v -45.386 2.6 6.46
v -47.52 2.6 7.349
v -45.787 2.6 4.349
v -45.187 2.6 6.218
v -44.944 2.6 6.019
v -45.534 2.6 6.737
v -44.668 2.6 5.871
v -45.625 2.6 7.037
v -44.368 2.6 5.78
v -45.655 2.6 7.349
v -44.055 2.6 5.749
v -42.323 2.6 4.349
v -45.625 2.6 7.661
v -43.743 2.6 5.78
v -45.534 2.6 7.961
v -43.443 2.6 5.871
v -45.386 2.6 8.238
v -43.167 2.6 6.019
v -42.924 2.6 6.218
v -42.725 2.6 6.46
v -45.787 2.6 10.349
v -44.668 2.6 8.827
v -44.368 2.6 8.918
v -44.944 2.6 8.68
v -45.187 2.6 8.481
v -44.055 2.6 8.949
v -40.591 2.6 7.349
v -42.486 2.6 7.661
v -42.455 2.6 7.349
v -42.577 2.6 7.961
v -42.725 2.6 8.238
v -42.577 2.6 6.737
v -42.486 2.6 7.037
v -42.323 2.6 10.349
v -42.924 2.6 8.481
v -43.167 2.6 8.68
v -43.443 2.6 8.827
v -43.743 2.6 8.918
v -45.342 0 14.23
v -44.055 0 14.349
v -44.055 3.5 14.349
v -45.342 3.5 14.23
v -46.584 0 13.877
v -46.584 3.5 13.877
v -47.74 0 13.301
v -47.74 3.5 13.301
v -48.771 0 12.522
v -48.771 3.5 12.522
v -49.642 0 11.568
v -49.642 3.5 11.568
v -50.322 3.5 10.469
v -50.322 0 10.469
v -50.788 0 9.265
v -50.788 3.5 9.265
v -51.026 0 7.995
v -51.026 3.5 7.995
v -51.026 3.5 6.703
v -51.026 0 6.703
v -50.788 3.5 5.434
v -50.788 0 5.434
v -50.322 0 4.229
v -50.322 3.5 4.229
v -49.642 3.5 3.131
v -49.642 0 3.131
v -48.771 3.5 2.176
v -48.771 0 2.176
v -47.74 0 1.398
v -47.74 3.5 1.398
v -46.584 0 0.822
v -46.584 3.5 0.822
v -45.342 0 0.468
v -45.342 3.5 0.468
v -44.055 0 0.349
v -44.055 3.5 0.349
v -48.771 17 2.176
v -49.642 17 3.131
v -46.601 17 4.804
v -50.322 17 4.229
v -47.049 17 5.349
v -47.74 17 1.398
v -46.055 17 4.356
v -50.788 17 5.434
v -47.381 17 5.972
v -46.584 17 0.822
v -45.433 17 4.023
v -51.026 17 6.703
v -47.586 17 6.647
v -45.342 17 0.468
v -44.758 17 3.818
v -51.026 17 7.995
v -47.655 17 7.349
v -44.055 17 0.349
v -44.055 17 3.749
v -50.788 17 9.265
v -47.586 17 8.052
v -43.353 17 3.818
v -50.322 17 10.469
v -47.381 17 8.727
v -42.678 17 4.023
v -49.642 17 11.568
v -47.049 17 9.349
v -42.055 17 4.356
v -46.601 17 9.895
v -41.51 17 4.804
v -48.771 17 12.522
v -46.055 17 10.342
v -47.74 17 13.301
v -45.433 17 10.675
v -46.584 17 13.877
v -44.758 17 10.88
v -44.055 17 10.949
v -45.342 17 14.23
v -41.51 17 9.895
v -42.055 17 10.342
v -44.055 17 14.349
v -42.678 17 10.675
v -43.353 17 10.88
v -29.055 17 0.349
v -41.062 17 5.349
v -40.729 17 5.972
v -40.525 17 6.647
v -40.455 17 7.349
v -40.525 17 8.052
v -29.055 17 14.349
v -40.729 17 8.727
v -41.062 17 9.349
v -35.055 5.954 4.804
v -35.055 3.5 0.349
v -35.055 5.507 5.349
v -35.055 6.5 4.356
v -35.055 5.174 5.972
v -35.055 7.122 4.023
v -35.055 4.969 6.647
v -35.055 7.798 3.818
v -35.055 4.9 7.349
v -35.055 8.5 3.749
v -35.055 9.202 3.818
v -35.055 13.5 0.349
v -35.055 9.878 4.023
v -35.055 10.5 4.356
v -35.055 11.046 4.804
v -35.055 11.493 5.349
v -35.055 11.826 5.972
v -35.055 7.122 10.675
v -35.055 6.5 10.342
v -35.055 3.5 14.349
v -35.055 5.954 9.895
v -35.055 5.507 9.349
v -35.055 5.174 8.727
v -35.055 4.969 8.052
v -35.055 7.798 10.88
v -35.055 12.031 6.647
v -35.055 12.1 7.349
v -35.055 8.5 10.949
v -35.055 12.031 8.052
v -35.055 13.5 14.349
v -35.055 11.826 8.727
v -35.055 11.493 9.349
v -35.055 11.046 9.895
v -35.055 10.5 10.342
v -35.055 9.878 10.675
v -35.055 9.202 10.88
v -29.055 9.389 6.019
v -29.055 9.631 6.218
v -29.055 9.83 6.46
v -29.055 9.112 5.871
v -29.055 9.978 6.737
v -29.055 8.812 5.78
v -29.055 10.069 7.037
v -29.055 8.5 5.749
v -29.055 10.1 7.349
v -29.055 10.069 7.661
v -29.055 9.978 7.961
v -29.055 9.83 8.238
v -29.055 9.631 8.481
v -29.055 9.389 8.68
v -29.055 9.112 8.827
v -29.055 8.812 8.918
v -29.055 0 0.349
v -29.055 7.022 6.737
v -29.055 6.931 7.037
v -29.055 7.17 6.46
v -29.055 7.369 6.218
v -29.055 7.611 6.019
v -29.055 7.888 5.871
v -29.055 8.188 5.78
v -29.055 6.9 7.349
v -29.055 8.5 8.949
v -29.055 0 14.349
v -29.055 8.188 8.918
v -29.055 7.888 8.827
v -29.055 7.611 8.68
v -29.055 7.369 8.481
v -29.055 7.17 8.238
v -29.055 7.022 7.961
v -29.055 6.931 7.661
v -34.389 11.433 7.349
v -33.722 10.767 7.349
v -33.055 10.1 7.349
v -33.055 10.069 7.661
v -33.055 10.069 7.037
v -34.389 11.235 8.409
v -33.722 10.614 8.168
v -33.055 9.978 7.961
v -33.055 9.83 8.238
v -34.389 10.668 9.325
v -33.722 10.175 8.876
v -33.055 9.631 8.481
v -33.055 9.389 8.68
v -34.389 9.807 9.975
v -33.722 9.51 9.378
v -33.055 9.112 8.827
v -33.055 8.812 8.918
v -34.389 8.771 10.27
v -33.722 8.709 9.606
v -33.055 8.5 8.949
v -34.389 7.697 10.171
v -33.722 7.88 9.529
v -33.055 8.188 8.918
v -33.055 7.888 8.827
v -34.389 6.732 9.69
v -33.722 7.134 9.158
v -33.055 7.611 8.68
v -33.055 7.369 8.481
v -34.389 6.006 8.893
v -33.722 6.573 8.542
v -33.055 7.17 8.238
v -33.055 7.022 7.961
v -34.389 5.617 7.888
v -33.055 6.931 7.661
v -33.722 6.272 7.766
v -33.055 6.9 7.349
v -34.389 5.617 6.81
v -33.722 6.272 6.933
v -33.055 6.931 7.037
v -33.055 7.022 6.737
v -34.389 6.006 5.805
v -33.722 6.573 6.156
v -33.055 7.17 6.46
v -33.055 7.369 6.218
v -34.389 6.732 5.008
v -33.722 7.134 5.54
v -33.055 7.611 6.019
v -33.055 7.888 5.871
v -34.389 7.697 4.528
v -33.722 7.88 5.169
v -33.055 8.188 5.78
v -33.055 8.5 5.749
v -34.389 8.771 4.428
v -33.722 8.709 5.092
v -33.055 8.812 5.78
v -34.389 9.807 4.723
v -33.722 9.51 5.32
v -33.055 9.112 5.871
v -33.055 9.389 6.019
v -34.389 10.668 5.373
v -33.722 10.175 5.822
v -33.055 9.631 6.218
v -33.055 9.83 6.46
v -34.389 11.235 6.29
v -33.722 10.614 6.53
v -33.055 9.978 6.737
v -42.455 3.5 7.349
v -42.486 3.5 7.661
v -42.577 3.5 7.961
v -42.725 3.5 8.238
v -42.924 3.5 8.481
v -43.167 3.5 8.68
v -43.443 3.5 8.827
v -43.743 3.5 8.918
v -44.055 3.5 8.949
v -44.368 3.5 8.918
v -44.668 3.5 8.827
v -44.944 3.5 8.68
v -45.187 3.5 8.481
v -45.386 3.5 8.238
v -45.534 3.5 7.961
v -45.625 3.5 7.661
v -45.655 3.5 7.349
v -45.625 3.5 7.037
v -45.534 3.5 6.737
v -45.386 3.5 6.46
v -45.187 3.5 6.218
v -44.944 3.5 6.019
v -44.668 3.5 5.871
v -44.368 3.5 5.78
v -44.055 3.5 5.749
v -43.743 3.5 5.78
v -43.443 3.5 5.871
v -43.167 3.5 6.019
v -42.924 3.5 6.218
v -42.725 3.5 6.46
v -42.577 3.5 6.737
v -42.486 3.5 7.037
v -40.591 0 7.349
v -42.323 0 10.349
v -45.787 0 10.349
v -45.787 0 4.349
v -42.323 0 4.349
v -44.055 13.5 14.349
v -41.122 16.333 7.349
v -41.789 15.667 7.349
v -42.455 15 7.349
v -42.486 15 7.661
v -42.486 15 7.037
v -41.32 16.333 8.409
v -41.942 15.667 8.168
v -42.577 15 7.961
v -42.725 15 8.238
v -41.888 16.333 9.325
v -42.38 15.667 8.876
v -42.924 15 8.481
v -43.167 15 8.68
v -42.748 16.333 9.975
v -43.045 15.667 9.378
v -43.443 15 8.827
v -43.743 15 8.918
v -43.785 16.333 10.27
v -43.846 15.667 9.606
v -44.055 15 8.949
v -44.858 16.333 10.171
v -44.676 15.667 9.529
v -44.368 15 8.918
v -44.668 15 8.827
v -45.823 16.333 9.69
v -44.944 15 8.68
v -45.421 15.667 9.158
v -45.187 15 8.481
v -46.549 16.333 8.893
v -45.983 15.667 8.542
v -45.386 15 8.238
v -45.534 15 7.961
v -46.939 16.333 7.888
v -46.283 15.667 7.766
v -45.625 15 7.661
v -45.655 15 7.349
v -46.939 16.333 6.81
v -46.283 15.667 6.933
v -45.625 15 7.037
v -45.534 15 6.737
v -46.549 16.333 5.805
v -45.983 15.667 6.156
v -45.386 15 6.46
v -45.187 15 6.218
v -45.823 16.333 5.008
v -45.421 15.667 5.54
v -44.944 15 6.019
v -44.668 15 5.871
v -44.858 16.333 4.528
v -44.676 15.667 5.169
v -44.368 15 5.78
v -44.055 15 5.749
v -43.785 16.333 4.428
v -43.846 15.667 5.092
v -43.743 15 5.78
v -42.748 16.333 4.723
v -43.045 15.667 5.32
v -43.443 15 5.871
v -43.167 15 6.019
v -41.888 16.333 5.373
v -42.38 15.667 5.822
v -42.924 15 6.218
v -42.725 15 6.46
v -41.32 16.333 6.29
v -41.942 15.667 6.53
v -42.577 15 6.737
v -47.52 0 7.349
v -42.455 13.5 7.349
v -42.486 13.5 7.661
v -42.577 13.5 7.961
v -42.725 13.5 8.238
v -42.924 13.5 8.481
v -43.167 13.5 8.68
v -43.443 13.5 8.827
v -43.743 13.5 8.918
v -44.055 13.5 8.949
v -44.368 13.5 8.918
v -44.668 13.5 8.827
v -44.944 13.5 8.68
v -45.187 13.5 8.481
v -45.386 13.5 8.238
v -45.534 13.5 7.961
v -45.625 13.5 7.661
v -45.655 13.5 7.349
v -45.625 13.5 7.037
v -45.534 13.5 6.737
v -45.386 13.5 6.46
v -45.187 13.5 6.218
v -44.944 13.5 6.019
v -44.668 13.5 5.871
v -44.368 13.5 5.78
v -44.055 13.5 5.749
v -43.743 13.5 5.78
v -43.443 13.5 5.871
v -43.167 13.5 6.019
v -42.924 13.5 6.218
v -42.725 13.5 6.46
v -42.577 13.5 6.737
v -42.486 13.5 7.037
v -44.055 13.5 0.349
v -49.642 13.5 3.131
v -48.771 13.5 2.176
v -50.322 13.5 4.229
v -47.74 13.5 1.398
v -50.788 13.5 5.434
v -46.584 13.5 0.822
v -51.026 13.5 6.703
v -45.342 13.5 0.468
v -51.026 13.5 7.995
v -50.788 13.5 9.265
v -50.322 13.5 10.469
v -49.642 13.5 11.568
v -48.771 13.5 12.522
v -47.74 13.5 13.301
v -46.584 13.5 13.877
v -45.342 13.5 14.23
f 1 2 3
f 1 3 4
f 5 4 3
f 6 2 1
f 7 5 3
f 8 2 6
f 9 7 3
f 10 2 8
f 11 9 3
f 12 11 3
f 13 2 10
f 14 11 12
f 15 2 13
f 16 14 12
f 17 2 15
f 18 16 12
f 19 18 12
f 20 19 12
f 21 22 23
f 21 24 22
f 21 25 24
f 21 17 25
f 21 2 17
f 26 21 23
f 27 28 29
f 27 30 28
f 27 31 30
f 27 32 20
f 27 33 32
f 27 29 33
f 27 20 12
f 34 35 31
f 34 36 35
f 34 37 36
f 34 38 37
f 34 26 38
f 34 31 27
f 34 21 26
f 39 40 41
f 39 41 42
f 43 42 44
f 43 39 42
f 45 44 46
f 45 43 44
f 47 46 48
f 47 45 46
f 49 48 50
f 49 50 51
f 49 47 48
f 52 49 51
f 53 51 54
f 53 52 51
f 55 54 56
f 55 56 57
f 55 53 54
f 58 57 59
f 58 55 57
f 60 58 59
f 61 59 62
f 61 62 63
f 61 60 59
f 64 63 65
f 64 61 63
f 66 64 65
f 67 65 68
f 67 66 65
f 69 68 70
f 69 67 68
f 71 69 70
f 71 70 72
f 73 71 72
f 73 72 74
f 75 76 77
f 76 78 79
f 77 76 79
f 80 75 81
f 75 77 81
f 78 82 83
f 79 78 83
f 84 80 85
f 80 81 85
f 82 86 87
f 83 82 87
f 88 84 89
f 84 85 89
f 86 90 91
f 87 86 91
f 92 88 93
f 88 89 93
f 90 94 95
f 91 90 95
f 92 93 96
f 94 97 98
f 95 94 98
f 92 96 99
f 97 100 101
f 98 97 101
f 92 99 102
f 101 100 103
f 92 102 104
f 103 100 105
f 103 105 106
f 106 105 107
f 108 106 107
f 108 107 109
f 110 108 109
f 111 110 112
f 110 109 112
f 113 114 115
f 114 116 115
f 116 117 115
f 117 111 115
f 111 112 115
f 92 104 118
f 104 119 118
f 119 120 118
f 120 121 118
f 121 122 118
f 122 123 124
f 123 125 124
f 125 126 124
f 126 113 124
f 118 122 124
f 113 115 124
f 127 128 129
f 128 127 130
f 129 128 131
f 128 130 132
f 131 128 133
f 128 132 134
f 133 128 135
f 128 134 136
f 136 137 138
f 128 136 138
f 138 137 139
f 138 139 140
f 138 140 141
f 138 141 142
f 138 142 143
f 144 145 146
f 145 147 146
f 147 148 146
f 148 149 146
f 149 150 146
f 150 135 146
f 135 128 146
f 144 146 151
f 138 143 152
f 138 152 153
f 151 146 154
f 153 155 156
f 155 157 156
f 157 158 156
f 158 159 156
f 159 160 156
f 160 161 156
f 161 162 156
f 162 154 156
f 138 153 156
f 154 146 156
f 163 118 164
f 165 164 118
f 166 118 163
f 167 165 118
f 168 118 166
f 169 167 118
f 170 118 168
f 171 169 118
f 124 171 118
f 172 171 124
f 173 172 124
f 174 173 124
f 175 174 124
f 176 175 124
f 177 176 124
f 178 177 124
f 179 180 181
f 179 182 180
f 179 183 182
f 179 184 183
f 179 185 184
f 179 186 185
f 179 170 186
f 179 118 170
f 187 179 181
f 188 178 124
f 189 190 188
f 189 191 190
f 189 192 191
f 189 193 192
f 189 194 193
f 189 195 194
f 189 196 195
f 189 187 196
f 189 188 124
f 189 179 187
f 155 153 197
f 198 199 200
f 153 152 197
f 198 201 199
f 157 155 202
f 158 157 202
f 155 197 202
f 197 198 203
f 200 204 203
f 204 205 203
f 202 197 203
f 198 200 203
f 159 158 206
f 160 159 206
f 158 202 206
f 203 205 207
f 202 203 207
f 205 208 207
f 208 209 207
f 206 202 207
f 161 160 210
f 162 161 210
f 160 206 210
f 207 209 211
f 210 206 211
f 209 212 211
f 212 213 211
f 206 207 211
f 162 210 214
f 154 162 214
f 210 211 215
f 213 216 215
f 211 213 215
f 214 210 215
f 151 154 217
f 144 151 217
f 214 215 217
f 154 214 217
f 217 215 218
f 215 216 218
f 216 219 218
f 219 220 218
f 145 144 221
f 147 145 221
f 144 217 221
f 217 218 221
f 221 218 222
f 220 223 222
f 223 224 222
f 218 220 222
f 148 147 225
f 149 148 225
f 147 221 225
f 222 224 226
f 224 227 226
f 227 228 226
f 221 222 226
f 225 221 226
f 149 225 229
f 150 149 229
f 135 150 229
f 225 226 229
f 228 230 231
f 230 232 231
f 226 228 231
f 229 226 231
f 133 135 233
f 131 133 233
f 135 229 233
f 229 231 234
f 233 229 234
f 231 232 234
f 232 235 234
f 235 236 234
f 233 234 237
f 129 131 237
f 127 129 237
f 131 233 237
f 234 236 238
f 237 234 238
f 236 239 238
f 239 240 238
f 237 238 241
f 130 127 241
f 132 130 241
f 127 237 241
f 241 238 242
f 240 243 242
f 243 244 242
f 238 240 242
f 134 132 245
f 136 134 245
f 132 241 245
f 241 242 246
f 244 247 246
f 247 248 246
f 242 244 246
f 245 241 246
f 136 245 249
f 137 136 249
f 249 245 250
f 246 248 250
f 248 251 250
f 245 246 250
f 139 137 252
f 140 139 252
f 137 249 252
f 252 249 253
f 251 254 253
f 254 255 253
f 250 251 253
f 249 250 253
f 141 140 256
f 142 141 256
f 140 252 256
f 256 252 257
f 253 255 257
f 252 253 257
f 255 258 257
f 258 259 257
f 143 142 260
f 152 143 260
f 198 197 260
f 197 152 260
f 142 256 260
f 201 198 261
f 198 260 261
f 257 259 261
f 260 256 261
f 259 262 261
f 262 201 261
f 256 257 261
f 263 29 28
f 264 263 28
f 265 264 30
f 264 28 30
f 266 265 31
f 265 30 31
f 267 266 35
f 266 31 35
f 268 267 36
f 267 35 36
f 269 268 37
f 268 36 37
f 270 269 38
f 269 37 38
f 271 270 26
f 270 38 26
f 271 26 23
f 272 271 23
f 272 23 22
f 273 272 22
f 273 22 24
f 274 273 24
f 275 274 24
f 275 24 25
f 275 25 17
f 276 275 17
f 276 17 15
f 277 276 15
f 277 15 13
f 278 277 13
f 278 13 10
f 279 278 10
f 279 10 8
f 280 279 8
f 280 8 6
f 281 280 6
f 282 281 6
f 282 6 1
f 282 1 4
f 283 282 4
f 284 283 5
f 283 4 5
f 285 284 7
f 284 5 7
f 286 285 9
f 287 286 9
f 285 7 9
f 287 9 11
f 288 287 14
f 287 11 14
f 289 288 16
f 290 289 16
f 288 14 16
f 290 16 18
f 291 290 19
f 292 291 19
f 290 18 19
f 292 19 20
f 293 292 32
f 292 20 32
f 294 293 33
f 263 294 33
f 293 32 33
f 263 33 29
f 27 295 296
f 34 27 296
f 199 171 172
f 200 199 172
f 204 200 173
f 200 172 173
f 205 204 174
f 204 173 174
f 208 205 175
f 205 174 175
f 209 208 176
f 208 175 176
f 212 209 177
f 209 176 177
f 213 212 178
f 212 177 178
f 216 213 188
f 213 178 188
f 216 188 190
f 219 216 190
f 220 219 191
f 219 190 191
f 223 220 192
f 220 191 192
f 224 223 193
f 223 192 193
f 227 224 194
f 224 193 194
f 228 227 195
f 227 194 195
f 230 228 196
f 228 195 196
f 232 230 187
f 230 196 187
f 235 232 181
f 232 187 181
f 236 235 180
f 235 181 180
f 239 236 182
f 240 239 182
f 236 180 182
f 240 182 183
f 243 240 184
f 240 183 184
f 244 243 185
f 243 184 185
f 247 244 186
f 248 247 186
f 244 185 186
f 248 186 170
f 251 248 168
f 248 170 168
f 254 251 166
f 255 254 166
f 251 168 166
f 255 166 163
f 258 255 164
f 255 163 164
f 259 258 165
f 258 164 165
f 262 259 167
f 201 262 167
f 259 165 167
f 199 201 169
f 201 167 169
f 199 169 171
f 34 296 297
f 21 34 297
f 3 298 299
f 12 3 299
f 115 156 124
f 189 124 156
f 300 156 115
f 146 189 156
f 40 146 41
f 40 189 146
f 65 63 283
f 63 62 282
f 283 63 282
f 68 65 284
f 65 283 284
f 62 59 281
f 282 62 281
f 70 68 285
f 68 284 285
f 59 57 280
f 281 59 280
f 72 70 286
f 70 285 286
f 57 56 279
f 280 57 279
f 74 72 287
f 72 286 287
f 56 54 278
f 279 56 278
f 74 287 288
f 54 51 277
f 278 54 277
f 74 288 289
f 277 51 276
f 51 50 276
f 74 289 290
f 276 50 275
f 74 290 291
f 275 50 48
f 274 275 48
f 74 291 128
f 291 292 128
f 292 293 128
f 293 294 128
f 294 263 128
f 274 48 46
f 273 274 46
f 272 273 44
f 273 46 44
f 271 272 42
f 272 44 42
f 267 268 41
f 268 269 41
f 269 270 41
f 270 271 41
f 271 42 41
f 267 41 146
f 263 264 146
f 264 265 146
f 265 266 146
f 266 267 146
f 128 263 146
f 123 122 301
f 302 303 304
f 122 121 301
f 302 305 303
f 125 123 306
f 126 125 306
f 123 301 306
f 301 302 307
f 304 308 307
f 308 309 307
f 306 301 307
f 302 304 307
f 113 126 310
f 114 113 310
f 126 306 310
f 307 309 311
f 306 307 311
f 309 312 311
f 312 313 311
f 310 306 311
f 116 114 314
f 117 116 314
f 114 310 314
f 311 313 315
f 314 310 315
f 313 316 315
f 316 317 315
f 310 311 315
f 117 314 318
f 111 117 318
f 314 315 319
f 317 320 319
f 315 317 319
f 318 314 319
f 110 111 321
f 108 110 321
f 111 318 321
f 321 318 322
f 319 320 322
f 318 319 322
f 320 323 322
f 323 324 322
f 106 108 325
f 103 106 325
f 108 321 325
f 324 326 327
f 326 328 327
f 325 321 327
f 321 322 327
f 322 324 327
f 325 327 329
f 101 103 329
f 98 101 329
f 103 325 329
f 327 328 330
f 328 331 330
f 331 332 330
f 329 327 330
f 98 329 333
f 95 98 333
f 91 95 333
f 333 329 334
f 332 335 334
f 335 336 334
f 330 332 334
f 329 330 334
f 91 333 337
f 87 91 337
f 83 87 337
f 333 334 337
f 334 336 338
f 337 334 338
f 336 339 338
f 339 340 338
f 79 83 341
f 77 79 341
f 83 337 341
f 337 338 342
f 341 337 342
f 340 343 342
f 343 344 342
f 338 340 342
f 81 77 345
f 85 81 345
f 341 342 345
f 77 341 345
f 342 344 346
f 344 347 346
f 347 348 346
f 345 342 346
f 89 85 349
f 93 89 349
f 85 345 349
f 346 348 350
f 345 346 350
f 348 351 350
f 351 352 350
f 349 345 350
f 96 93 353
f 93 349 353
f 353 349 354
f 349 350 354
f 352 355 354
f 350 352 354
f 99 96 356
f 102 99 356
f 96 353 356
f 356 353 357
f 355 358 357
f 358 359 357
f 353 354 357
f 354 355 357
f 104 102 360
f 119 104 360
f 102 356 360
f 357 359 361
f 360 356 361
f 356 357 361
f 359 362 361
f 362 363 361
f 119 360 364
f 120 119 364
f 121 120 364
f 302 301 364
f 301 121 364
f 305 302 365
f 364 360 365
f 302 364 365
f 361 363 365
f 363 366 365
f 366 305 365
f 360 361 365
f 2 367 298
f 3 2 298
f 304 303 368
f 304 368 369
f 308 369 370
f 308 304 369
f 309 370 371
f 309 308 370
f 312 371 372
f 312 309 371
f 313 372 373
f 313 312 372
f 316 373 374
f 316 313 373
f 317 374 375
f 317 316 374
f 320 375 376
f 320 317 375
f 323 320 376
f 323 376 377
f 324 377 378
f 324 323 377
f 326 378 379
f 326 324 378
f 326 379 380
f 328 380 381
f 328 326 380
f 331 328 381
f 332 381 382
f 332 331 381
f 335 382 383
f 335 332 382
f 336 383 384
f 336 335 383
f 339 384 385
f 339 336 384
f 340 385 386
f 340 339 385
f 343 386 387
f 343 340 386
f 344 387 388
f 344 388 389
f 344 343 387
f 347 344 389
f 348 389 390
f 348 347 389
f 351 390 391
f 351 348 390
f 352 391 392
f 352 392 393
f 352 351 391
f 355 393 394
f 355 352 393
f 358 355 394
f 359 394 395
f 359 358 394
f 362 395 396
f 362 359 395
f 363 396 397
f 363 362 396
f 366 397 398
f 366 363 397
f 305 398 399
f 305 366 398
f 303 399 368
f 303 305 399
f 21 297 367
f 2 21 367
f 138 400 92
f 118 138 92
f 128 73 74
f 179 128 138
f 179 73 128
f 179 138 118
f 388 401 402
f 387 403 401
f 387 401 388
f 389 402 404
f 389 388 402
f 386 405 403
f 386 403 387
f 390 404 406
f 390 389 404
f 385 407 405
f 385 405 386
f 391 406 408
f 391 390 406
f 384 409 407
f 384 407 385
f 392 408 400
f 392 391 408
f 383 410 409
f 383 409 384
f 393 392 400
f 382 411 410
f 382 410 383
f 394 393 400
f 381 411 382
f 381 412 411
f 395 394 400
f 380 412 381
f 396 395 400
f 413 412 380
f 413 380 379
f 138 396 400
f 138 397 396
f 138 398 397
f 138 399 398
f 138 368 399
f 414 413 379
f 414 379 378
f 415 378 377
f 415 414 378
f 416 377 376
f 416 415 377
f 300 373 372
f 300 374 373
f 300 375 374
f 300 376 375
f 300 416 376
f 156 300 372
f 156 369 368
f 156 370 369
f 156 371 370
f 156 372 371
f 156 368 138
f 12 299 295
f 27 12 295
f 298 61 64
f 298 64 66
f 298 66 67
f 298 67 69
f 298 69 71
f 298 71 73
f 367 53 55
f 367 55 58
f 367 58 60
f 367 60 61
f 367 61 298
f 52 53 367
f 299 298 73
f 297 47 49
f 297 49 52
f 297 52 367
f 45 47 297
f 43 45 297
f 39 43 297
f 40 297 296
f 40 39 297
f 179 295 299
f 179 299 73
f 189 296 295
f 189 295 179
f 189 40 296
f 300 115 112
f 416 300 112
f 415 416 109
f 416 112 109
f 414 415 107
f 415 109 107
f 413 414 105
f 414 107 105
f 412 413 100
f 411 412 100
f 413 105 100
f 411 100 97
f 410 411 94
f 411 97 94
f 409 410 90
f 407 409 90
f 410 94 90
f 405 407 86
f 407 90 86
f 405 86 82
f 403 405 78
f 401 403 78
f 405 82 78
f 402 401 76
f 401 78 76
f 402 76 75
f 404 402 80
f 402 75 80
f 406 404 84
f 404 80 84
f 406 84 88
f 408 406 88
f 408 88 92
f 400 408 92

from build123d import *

# Parameters (mm, degrees)
F0_R     = 1.6
F4_DEPTH = 3.5
F3_W     = 17
F3_H     = 14
F3_R     = 1.6
F7_DEPTH = 6
F8_R     = 1.6
F9_DEPTH = 2.6
F10_SIZE = 2


with BuildPart() as f4:
    # F0 (on Front) → F4 (new body, through all)
    with BuildSketch(Plane.XZ):
        with BuildLine():
            Line((-29.0554127395, 14.3491971341), (-44.0554127395, 14.3491971341))
            ThreePointArc((-44.0554127395, 14.3491971341), (-51.0554127395, 7.3491971341), (-44.0554127395, 0.3491971341))
            Line((-44.0554127395, 0.3491971341), (-29.0554127395, 0.3491971341))
            Line((-29.0554127395, 0.3491971341), (-29.0554127395, 14.3491971341))
        make_face()
        with Locations((-44.0554127395, 7.3491971341)):
            Circle(F0_R, mode=Mode.SUBTRACT)
    extrude(amount=-F4_DEPTH)


with BuildPart() as f6_1:
    # F6: instance of F4
    add(f4.part.mirror(Plane(origin=(0, 8.5, 0), x_dir=(-1, 0, 0), z_dir=(0, 1, 0))))


with BuildPart() as f4_1:
    add(f4.part)

    add(f6_1.part)  # F7 merges F6_1
    # F3 (on face) → F7 (join, through all)
    with BuildSketch(Plane.YZ.offset(-29.0554127395)):
        with Locations((8.5, 7.3491971341)):
            Rectangle(F3_W, F3_H)
        with Locations((8.5, 7.3491971341)):
            Circle(F3_R, mode=Mode.SUBTRACT)
    extrude(amount=-F7_DEPTH)

    # F8 (on face) → F9 (cut)
    with BuildSketch(Plane.XZ):
        Polygon((-42.3233619319, 10.3491971341), (-45.7874635471, 10.3491971341), (-47.5195143547, 7.3491971341), (-45.7874635471, 4.3491971341), (-42.3233619319, 4.3491971341), (-40.5913111244, 7.3491971341), align=None)
        with Locations((-44.0554127395, 7.3491971341)):
            Circle(F8_R, mode=Mode.SUBTRACT)
    extrude(amount=-F9_DEPTH, mode=Mode.SUBTRACT)

    # F10
    f10_edges = [f4_1.edges().sort_by_distance(p)[0] for p in [
        (-45.655413, 17, 7.349197),
        (-35.055413, 6.9, 7.349197),
    ]]
    chamfer(f10_edges, length=F10_SIZE)


solid = f4_1.part
